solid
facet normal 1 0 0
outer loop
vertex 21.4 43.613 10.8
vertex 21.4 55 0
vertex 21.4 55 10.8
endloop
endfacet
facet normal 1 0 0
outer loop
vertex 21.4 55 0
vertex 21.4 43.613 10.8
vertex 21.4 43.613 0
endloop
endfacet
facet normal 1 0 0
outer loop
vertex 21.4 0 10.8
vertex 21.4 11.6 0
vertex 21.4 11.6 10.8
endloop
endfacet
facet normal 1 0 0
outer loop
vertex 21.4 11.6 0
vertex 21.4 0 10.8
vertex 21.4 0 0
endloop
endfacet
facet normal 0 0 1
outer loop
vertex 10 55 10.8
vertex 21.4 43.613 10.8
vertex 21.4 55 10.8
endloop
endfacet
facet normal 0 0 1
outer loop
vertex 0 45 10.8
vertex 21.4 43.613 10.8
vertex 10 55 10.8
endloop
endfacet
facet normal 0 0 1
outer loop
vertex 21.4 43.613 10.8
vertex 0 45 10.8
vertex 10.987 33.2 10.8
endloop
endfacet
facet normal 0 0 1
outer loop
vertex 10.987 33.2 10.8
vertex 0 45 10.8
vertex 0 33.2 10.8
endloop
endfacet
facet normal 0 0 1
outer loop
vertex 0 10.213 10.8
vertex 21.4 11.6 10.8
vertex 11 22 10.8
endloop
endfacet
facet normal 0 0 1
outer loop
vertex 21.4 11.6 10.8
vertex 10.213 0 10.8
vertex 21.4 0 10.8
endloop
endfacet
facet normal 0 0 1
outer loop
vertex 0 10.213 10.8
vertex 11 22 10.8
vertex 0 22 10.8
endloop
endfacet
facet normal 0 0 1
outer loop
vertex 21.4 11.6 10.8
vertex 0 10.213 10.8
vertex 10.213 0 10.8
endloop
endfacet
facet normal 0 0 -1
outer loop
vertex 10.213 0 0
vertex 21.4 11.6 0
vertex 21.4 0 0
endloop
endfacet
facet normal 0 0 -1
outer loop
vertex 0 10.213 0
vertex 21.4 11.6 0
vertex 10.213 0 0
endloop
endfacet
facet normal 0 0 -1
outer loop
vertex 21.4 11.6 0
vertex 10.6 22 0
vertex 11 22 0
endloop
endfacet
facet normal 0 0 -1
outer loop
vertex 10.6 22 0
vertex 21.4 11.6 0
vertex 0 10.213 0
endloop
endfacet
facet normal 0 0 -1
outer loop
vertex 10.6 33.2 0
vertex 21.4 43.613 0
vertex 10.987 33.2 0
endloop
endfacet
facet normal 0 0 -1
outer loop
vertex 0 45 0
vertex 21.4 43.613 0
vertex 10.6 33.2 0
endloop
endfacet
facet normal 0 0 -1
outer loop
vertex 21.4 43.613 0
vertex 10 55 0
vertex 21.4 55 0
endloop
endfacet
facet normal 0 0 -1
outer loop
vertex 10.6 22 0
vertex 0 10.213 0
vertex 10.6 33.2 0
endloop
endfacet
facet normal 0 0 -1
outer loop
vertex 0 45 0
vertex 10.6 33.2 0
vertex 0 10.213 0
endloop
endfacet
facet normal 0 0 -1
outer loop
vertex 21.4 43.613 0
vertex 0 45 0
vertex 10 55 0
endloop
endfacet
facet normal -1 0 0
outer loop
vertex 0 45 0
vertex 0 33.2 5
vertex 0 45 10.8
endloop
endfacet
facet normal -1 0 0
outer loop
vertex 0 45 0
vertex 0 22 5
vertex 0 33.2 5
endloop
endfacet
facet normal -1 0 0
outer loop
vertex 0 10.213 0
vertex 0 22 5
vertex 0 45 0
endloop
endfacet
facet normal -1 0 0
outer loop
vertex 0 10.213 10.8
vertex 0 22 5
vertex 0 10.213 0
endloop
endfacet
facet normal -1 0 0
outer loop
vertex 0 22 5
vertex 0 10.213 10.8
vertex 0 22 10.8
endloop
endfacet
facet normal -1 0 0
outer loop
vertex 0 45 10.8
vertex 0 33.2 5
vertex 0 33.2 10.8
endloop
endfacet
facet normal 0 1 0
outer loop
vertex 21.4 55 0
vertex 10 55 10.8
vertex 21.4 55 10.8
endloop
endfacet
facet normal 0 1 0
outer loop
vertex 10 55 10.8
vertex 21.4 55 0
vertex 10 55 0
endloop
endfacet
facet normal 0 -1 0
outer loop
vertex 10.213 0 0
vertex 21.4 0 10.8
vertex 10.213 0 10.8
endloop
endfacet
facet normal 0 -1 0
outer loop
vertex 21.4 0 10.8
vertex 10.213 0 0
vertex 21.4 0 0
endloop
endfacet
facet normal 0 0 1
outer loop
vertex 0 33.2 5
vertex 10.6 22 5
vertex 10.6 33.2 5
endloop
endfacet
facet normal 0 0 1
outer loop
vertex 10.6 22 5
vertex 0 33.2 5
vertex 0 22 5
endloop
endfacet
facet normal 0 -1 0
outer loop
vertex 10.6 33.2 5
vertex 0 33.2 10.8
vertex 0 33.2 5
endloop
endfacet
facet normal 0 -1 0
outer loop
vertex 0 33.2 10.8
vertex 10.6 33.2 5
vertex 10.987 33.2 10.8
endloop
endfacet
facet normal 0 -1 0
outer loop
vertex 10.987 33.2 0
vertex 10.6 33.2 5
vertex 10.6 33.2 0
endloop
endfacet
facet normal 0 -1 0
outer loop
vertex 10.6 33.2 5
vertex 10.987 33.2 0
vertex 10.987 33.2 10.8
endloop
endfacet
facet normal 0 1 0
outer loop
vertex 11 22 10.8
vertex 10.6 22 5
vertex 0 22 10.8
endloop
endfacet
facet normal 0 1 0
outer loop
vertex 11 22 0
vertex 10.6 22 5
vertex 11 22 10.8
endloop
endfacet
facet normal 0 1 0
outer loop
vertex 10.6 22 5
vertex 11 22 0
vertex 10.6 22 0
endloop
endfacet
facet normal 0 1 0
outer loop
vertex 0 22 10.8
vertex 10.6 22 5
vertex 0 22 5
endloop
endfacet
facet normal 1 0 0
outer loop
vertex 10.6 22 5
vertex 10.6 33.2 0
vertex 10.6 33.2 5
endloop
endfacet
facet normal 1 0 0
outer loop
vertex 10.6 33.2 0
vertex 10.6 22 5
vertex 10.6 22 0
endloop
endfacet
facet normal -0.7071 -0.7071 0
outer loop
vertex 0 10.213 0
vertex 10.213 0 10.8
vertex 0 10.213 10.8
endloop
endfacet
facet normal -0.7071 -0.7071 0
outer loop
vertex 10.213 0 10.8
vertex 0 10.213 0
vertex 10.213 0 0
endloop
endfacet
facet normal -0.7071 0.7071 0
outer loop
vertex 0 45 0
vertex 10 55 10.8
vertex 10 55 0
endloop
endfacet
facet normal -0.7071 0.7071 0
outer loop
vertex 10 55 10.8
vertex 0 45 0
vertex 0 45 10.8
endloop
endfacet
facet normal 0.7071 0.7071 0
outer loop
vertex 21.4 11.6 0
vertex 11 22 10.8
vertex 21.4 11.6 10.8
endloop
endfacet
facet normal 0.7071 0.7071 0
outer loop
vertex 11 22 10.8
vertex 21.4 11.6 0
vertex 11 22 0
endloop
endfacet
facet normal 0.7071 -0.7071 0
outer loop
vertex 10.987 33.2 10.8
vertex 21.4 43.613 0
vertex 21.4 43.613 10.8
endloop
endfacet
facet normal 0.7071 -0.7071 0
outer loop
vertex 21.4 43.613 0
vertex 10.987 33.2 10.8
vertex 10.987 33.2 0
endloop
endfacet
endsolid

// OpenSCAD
difference(){
cube ([21.4,55,10.8]);
translate([-1,22,5]) cube([13,11.2,7]);
translate([10.6,22,-1]) cube([20,11.2,13]);

translate([0,-11,-1]) rotate(a=[0,0,45]) cube(15);
translate([0,45,-1]) rotate(a=[0,0,45]) cube(15);
translate([21.5,11.5,-1]) rotate(a=[0,0,45]) cube(15);
translate([21.5,22.5,-1]) rotate(a=[0,0,45]) cube(15);
}
